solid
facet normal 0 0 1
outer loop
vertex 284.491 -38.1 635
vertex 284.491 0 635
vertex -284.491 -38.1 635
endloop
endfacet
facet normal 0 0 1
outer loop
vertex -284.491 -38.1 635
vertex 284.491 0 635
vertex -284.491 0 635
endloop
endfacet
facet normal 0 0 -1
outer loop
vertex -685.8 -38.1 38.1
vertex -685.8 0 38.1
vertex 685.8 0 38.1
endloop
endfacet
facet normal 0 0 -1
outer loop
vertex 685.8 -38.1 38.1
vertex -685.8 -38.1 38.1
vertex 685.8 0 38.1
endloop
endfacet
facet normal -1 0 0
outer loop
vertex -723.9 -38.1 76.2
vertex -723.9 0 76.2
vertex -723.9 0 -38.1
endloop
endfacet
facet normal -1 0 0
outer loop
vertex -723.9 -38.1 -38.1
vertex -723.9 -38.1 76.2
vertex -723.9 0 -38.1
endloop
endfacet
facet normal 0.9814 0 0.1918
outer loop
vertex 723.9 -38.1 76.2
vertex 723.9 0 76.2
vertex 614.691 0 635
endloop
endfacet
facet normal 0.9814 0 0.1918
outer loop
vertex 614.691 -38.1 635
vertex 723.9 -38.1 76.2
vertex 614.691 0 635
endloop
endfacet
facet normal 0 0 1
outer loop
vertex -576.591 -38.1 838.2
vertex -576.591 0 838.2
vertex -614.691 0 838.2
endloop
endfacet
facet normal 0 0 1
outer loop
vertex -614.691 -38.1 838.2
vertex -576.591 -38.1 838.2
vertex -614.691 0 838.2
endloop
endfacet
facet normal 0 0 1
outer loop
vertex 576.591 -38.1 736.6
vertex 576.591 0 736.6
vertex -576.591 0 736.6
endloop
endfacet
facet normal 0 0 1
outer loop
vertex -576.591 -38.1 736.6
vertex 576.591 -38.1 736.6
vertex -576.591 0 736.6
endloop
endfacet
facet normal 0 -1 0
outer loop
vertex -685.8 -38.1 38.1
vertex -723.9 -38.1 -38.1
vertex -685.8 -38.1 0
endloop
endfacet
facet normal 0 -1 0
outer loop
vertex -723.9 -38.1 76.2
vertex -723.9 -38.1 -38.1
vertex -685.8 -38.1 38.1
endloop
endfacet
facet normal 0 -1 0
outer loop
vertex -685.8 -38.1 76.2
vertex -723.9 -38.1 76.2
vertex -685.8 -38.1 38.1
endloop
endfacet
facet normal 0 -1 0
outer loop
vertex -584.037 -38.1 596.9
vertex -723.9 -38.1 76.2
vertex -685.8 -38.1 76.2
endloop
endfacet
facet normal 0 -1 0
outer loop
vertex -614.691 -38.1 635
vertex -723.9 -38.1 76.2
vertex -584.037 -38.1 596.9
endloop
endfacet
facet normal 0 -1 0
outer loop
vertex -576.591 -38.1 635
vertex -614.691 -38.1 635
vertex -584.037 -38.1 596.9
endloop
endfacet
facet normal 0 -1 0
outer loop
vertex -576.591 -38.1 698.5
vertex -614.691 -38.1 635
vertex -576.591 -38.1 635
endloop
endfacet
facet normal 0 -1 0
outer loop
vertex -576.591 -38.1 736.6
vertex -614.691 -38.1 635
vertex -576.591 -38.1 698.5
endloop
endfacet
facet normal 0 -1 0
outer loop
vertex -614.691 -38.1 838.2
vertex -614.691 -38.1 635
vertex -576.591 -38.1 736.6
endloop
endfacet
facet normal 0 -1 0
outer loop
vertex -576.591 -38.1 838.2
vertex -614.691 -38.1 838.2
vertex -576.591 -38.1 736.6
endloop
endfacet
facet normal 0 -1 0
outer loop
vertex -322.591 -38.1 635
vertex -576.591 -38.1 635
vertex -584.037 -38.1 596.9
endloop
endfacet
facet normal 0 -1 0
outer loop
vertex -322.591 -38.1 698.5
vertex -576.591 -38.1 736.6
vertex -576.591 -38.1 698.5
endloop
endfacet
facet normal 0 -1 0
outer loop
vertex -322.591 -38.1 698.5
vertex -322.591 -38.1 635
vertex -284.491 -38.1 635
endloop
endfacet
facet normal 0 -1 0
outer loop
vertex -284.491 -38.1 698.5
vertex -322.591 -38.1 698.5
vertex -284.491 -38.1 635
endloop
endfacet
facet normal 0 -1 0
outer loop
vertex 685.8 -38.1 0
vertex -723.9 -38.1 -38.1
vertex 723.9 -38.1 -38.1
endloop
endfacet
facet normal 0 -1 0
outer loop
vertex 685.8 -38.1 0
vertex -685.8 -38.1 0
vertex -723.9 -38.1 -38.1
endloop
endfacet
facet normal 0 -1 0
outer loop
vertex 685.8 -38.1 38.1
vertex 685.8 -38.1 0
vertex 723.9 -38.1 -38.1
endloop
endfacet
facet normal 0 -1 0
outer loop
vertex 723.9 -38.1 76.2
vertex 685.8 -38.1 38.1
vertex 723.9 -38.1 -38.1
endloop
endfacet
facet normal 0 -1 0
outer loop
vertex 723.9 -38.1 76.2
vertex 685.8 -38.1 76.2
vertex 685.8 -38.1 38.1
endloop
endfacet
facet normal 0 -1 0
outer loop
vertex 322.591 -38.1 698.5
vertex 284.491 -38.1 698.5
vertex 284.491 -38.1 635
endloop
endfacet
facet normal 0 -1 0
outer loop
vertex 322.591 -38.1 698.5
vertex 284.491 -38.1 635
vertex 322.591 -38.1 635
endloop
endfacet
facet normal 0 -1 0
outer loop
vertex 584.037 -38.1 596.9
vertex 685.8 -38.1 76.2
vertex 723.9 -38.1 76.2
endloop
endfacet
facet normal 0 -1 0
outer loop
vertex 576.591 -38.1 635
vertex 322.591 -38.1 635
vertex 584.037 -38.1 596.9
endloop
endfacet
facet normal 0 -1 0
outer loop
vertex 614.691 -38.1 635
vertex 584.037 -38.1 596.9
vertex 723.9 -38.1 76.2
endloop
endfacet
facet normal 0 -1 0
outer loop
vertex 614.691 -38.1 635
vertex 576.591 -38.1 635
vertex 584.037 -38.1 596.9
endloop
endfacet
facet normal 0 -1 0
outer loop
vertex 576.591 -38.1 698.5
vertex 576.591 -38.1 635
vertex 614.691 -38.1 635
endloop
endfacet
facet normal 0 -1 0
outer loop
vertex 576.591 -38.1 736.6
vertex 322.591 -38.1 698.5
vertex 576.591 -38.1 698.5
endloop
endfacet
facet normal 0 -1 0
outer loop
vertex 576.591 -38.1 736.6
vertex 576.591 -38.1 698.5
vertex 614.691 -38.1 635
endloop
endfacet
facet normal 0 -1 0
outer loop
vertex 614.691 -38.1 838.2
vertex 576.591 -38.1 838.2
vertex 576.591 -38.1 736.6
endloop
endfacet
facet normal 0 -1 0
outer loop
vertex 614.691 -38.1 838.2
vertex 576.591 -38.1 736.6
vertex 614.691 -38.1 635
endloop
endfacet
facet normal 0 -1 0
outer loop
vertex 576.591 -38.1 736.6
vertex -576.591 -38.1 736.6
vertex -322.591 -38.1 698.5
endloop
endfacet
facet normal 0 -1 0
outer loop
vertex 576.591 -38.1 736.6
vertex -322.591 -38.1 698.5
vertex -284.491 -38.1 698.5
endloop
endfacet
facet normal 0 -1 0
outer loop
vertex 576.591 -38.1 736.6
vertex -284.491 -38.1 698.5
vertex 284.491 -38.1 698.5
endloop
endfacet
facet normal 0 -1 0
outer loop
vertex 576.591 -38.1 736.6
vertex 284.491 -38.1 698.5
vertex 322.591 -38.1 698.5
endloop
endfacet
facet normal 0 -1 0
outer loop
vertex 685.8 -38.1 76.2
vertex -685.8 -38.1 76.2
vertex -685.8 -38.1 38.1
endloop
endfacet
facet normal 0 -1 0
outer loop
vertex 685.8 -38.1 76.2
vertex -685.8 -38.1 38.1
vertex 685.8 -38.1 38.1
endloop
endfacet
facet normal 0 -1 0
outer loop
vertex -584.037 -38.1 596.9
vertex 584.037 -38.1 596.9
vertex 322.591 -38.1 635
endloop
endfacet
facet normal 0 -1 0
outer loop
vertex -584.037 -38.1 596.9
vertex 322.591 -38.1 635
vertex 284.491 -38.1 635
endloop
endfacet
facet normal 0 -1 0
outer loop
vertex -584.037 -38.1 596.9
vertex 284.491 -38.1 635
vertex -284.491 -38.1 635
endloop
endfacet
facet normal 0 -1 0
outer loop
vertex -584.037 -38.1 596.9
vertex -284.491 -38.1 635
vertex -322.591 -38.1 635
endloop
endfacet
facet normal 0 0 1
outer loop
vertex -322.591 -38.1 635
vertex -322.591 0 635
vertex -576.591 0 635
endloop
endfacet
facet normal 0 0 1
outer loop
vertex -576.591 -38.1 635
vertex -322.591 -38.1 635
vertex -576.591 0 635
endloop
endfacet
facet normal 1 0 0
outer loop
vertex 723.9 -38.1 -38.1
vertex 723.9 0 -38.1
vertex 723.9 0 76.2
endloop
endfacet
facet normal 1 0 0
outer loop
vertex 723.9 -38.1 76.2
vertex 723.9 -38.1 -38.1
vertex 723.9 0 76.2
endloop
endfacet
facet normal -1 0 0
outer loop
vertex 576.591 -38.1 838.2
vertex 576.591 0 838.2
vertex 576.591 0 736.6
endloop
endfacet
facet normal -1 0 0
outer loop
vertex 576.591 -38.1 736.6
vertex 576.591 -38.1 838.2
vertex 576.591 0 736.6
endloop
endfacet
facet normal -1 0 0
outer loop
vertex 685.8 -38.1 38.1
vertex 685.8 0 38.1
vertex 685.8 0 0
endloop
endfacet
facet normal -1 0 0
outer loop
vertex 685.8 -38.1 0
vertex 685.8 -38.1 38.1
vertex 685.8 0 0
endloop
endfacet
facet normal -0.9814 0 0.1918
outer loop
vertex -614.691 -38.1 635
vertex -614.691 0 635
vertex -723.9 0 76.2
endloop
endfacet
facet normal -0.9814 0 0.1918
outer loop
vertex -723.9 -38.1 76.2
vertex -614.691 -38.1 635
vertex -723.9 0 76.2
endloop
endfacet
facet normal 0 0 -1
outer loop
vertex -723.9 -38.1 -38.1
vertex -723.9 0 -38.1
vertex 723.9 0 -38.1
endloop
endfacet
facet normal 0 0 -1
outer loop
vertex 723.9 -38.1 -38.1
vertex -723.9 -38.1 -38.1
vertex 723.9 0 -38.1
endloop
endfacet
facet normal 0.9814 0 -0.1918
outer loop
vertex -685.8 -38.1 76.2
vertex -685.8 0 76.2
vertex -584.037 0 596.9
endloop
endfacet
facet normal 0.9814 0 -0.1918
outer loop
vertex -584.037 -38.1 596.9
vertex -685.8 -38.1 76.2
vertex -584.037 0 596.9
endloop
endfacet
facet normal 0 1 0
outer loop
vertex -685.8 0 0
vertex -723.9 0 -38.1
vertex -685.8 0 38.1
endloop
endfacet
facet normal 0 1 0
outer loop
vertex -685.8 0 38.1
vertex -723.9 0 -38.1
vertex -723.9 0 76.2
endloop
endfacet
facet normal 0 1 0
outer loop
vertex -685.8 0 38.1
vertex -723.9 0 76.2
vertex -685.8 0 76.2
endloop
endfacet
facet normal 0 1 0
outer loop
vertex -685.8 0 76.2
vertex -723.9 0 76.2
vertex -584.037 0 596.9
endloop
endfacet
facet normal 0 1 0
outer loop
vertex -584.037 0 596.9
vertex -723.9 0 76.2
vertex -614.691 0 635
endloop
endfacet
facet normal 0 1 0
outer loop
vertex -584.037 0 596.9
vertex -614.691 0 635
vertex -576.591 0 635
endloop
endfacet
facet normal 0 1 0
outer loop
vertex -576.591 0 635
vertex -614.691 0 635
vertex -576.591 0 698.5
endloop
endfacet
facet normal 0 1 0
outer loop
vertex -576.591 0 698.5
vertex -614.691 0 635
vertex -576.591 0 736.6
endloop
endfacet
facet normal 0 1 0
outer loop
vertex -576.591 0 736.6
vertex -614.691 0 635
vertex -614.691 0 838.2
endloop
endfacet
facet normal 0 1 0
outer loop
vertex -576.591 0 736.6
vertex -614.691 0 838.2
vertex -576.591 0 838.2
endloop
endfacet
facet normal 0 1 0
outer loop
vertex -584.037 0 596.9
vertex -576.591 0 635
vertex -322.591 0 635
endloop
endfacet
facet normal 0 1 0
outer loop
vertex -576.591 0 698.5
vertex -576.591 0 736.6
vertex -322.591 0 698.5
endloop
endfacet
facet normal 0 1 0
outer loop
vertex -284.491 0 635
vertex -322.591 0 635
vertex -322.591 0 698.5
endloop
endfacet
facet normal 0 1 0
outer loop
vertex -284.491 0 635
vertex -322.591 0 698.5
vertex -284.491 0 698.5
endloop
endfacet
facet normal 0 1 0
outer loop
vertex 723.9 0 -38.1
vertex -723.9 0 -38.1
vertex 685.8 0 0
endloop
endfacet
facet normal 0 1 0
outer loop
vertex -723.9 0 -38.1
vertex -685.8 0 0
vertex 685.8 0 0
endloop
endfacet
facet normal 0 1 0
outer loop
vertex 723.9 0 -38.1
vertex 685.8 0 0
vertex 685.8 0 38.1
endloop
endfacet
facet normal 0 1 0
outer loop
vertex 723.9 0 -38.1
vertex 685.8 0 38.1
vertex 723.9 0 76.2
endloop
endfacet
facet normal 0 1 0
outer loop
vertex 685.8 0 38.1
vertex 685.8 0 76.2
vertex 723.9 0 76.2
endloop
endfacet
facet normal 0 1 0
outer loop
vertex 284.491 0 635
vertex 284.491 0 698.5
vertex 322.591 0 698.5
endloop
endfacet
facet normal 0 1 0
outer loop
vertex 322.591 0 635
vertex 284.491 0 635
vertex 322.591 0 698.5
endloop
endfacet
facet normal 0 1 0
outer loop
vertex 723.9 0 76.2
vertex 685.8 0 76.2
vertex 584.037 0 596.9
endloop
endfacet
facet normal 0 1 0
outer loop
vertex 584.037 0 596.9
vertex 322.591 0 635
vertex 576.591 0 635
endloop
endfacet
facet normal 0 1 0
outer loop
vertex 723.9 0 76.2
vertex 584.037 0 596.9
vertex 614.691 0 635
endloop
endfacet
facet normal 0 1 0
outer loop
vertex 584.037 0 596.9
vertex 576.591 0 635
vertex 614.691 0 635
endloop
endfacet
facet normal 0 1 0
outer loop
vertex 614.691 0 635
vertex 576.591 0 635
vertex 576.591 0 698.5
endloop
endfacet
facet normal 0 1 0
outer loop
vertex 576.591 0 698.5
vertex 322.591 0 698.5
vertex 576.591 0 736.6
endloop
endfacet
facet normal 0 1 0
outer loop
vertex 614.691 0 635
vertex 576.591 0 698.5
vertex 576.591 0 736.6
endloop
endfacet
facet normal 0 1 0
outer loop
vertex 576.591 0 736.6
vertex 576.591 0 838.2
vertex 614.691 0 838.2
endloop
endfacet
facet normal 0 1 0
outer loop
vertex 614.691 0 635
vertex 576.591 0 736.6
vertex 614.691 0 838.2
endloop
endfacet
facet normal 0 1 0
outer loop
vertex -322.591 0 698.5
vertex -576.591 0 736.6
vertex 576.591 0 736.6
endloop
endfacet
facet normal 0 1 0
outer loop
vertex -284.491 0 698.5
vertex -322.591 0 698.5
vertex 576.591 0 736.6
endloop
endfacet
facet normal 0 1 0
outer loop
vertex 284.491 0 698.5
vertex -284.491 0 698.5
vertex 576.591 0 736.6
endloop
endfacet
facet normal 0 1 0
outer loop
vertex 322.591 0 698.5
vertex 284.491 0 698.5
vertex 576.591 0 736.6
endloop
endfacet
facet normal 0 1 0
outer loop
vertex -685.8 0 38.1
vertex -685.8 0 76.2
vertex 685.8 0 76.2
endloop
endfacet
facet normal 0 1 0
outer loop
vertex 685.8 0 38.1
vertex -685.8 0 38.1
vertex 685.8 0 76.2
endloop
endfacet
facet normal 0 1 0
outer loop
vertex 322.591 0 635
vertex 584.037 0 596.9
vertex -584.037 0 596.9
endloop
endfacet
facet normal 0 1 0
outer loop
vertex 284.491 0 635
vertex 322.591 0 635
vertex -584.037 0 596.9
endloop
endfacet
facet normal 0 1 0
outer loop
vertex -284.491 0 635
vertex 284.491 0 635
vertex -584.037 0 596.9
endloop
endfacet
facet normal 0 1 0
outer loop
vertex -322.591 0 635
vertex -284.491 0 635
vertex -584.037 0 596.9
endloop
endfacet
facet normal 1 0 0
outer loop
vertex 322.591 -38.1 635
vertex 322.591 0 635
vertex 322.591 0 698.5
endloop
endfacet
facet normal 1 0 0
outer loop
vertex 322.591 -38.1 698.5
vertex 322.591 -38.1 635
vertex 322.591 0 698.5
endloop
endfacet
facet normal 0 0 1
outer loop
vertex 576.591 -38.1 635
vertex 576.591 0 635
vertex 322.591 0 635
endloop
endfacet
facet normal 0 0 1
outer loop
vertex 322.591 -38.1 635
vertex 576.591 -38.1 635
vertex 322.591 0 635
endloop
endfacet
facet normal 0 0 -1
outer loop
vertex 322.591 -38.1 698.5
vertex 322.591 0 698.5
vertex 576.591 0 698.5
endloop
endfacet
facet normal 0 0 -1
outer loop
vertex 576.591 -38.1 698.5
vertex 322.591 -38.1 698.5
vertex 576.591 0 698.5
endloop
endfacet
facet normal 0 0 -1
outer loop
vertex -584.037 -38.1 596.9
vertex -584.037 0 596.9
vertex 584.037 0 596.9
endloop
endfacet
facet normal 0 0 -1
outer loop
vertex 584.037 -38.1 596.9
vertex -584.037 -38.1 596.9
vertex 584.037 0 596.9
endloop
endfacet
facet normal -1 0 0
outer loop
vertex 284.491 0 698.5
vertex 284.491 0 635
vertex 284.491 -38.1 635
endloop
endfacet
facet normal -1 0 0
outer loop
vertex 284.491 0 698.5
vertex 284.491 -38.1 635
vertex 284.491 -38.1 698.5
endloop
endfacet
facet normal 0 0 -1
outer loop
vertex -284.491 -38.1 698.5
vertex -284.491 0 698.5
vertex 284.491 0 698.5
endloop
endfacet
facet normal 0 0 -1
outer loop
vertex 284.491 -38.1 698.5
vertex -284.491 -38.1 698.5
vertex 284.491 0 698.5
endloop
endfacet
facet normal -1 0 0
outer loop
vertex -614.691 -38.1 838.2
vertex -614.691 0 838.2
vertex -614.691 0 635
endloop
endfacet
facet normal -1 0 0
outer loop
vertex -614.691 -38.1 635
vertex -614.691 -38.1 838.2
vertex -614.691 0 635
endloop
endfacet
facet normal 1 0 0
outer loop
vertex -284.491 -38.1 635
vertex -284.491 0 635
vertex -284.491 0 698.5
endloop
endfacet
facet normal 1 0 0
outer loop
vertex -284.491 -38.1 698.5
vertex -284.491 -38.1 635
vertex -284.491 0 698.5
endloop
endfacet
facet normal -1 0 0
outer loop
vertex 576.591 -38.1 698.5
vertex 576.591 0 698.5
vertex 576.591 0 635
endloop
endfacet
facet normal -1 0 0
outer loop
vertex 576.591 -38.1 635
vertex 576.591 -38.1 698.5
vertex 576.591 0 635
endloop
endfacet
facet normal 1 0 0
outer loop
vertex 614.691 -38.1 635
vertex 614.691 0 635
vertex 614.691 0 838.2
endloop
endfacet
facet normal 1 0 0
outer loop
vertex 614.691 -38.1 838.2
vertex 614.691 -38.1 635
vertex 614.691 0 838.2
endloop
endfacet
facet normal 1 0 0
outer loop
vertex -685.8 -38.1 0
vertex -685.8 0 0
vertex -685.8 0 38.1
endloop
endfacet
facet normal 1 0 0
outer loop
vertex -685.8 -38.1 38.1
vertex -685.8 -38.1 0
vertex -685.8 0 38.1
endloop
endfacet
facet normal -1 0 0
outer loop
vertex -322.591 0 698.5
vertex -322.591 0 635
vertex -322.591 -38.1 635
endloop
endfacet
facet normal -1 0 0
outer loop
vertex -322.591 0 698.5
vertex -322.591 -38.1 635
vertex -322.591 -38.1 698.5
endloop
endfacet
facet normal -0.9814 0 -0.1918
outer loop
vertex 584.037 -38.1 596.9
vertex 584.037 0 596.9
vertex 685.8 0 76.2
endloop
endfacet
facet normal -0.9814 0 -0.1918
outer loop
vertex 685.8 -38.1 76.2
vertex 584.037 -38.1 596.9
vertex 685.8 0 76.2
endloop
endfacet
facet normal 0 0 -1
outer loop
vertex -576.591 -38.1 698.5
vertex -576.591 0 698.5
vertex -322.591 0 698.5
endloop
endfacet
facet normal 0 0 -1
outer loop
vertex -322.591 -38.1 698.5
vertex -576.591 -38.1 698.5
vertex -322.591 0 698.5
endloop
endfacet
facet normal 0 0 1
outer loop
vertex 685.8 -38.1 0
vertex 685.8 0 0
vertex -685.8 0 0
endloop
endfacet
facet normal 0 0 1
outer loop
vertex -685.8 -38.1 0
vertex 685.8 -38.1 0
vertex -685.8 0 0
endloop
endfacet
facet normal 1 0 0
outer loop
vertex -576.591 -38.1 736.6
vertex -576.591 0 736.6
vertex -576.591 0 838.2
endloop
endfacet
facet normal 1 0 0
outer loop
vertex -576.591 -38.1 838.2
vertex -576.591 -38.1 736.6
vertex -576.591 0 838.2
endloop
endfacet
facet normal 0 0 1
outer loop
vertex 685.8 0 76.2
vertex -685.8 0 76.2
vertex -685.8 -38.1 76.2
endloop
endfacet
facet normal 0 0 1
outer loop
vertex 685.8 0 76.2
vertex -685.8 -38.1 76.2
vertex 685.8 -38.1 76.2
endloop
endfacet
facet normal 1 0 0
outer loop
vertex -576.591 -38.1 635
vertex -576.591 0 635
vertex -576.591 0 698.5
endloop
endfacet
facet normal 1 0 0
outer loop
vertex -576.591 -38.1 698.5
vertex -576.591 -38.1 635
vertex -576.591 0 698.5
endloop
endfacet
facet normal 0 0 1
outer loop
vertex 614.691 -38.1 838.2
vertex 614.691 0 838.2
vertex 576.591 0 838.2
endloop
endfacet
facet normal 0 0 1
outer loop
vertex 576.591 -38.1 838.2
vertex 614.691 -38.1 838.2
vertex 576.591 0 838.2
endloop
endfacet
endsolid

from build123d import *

# Parameters (mm, degrees)
F0_W     = 1371.6
F0_H     = 38.1
F1_DEPTH = 38.1
F0_W_2   = 38.1
F0_H_2   = 63.5
F2_DEPTH = 38.1


with BuildPart() as f1:
    # F0 (on Front) → F1 (new body)
    with BuildSketch(Plane.XZ):
        Polygon((-723.9, 76.2), (-723.9, 0), (-685.8, 0), (-685.8, 38.1), (-685.8, 76.2), (-584.037135, 596.9), (-576.591072, 635), (-576.591072, 698.5), (-576.591072, 736.6), (-576.591072, 838.2), (-614.691072, 838.2), (-614.691072, 635), align=None)
        Polygon((-576.591072, 635), (-584.037135, 596.9), (584.037135, 596.9), (576.591072, 635), (322.591072, 635), (284.491072, 635), (-284.491072, 635), (-322.591072, 635), align=None)
        Polygon((576.591072, 736.6), (-576.591072, 736.6), (-576.591072, 698.5), (-322.591072, 698.5), (-284.491072, 698.5), (284.491072, 698.5), (322.591072, 698.5), (576.591072, 698.5), align=None)
        Polygon((685.8, 38.1), (685.8, 0), (723.9, 0), (723.9, 76.2), (614.691072, 635), (614.691072, 838.2), (576.591072, 838.2), (576.591072, 736.6), (576.591072, 698.5), (576.591072, 635), (584.037135, 596.9), (685.8, 76.2), align=None)
        with Locations((0, 57.15)):
            Rectangle(F0_W, F0_H)
        Polygon((-685.8, 0), (-723.9, 0), (-723.9, -38.1), (723.9, -38.1), (723.9, 0), (685.8, 0), align=None)
    extrude(amount=F1_DEPTH)

    # F0 (on Front) → F2 (join)
    with BuildSketch(Plane.XZ):
        Polygon((-723.9, 76.2), (-723.9, 0), (-685.8, 0), (-685.8, 38.1), (-685.8, 76.2), (-584.037135, 596.9), (-576.591072, 635), (-576.591072, 698.5), (-576.591072, 736.6), (-576.591072, 838.2), (-614.691072, 838.2), (-614.691072, 635), align=None)
        Polygon((685.8, 38.1), (685.8, 0), (723.9, 0), (723.9, 76.2), (614.691072, 635), (614.691072, 838.2), (576.591072, 838.2), (576.591072, 736.6), (576.591072, 698.5), (576.591072, 635), (584.037135, 596.9), (685.8, 76.2), align=None)
        Polygon((-685.8, 0), (-723.9, 0), (-723.9, -38.1), (723.9, -38.1), (723.9, 0), (685.8, 0), align=None)
        Polygon((576.591072, 736.6), (-576.591072, 736.6), (-576.591072, 698.5), (-322.591072, 698.5), (-284.491072, 698.5), (284.491072, 698.5), (322.591072, 698.5), (576.591072, 698.5), align=None)
        with Locations((-303.541072, 666.75)):
            Rectangle(F0_W_2, F0_H_2)
        with Locations((303.541072, 666.75)):
            Rectangle(F0_W_2, F0_H_2)
    extrude(amount=F2_DEPTH)


solid = f1.part
